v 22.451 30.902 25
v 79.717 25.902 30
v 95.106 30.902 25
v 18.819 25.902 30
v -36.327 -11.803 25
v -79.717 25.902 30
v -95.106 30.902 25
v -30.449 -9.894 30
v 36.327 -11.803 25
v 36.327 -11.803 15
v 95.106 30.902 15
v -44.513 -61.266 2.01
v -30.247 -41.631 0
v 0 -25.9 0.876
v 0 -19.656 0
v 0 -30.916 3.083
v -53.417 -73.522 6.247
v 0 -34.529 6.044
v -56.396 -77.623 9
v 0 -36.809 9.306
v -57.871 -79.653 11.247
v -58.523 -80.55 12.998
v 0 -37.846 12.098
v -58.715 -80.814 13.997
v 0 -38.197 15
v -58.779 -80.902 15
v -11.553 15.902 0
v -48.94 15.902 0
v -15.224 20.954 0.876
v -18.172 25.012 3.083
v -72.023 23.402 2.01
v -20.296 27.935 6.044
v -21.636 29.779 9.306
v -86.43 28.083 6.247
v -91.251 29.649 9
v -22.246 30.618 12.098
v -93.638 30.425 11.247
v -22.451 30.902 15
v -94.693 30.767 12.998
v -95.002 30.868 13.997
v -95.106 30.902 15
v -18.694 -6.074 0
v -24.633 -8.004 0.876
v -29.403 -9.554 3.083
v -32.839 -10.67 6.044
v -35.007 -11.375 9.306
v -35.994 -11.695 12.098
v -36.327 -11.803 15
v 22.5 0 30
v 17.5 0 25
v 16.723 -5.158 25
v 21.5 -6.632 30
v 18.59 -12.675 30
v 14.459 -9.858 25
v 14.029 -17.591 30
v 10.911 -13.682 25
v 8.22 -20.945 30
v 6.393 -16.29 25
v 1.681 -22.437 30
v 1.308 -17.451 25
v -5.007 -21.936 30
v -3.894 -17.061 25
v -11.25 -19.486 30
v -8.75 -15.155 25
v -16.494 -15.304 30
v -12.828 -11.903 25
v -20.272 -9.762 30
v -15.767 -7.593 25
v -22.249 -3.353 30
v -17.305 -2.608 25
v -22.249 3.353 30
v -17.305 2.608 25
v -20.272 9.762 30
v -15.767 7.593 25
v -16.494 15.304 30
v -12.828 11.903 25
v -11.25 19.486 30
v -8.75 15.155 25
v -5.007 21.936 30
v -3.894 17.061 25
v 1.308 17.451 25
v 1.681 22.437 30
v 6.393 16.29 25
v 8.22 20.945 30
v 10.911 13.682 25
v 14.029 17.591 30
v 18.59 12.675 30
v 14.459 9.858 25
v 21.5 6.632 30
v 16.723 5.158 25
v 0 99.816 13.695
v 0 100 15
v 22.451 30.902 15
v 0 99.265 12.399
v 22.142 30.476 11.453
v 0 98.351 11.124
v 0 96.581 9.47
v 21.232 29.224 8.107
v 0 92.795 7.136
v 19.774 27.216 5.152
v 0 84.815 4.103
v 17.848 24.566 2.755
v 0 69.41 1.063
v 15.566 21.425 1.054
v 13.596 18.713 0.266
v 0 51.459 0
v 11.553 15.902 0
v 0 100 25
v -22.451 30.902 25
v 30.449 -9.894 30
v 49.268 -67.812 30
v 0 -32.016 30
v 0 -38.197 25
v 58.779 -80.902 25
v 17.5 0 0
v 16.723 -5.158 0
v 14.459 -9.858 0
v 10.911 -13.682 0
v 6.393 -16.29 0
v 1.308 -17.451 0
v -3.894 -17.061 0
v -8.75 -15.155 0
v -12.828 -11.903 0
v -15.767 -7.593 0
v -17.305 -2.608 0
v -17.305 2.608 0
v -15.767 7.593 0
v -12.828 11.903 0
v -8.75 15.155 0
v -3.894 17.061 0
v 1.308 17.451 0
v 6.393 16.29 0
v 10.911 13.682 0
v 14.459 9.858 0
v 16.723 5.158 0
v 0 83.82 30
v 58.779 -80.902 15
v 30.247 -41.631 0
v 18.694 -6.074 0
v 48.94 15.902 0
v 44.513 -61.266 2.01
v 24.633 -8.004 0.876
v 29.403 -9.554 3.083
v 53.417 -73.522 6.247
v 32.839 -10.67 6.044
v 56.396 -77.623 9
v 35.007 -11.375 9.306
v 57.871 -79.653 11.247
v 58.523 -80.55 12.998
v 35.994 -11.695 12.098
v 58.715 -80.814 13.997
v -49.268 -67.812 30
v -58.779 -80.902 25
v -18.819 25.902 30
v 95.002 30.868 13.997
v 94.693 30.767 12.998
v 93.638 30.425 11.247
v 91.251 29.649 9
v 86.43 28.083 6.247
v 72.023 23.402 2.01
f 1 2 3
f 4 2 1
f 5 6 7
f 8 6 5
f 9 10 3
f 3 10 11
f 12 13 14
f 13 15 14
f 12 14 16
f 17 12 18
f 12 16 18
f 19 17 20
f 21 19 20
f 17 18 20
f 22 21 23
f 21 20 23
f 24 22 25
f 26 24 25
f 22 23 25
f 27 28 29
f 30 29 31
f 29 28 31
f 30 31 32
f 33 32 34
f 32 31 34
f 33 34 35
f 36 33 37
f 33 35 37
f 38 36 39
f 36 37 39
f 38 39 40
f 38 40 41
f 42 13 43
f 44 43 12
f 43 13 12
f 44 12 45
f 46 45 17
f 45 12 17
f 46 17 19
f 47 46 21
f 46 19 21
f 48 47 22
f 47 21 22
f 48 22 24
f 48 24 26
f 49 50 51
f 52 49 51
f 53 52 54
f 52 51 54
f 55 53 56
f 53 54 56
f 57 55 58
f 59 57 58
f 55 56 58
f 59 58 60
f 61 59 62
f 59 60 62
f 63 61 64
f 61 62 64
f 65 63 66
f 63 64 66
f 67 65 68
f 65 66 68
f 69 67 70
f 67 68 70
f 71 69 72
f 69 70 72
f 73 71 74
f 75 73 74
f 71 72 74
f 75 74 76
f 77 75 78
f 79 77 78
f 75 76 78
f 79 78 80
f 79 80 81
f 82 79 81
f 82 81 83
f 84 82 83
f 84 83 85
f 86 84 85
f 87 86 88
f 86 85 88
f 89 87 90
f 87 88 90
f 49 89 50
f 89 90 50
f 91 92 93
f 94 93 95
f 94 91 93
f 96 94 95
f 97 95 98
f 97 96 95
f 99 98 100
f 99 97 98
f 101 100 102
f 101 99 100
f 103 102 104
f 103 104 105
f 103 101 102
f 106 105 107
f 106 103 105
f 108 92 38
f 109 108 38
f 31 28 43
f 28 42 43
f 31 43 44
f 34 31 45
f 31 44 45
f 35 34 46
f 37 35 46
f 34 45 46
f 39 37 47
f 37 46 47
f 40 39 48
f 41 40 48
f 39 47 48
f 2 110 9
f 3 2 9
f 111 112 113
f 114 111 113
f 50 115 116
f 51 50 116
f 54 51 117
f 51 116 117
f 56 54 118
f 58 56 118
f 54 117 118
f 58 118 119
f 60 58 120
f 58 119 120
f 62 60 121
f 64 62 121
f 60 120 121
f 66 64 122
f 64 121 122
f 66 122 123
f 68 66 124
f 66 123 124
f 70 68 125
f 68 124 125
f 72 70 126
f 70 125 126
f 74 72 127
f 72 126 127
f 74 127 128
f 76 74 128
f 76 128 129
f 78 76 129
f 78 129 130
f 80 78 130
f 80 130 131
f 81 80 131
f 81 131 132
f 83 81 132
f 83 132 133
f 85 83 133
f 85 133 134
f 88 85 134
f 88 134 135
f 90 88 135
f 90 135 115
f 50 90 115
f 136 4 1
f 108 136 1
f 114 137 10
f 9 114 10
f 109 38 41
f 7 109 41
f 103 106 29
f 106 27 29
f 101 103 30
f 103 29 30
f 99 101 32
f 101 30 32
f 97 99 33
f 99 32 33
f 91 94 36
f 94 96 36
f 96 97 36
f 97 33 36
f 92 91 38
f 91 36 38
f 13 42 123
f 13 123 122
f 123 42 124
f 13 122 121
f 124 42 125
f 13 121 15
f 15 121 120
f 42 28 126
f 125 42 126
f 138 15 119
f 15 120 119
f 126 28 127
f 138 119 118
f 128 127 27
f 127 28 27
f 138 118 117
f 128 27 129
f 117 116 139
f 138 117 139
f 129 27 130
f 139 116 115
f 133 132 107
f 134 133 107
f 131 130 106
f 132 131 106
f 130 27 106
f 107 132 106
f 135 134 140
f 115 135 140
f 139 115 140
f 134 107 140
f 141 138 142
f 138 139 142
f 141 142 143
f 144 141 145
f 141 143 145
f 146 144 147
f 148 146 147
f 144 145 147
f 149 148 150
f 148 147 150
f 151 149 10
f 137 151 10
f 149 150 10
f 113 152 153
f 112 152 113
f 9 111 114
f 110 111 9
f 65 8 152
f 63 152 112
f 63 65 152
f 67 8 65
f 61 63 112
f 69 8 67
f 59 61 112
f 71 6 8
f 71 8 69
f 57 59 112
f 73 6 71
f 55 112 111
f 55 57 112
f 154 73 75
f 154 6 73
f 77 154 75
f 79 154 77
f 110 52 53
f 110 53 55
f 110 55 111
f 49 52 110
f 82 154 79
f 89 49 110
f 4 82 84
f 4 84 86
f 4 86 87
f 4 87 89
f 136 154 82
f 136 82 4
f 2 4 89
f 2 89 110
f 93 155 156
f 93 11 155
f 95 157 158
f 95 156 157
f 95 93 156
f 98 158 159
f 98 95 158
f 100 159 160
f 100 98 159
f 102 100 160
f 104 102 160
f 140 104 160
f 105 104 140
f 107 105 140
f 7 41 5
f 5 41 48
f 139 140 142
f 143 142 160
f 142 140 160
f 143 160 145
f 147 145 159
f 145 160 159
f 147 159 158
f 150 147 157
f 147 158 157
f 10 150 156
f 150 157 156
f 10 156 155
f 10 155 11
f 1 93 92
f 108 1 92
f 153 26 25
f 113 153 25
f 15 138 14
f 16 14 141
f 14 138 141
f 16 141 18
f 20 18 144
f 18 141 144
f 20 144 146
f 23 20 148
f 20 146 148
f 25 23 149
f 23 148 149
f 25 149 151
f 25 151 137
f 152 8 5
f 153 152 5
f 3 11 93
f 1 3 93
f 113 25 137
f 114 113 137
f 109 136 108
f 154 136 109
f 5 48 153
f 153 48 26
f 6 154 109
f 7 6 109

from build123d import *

# Parameters (mm, degrees)
F1_DEPTH = 30
F2_SIZE  = 5
F3_R     = 15
F4_R     = 17.5
F5_DEPTH = 40
F6_SIZE  = 5


with BuildPart() as f1:
    # F0 (on Top) → F1 (new body)
    with BuildSketch(Plane.XY):
        Polygon((22.451399, 30.901699), (0, 100), (-22.451399, 30.901699), (-95.105652, 30.901699), (-36.327126, -11.803399), (-58.778525, -80.901699), (0, -38.196601), (58.778525, -80.901699), (36.327126, -11.803399), (95.105652, 30.901699), align=None)
    extrude(amount=F1_DEPTH)

    # F2
    f2_edges = [f1.edges().sort_by_distance(p)[0] for p in [
        (65.716389, 9.54915, 30),
        (58.778525, 30.901699, 30),
        (11.225699, 65.45085, 30),
        (-11.225699, 65.45085, 30),
        (-58.778525, 30.901699, 30),
        (-65.716389, 9.54915, 30),
        (-47.552826, -46.352549, 30),
        (-29.389263, -59.54915, 30),
        (29.389263, -59.54915, 30),
        (47.552826, -46.352549, 30),
    ]]
    chamfer(f2_edges, length=F2_SIZE)

    # F3
    f3_edges = [f1.edges().sort_by_distance(p)[0] for p in [
        (65.716389, 9.54915, 0),
        (58.778525, 30.901699, 0),
        (11.225699, 65.45085, 0),
        (-11.225699, 65.45085, 0),
        (-58.778525, 30.901699, 0),
        (-65.716389, 9.54915, 0),
        (-47.552826, -46.352549, 0),
        (-29.389263, -59.54915, 0),
        (29.389263, -59.54915, 0),
        (47.552826, -46.352549, 0),
    ]]
    fillet(f3_edges, radius=F3_R)

    # F4 (on face) → F5 (cut)
    with BuildSketch(Plane(origin=(0, 0, 0), x_dir=(1, 0, 0), z_dir=(0, 0, -1))):
        Circle(F4_R)
    extrude(amount=-F5_DEPTH, mode=Mode.SUBTRACT)

    # F6
    f6_edges = [f1.edges().sort_by_distance(p)[0] for p in [
        (-17.5, 0, 30),
    ]]
    chamfer(f6_edges, length=F6_SIZE)


solid = f1.part
